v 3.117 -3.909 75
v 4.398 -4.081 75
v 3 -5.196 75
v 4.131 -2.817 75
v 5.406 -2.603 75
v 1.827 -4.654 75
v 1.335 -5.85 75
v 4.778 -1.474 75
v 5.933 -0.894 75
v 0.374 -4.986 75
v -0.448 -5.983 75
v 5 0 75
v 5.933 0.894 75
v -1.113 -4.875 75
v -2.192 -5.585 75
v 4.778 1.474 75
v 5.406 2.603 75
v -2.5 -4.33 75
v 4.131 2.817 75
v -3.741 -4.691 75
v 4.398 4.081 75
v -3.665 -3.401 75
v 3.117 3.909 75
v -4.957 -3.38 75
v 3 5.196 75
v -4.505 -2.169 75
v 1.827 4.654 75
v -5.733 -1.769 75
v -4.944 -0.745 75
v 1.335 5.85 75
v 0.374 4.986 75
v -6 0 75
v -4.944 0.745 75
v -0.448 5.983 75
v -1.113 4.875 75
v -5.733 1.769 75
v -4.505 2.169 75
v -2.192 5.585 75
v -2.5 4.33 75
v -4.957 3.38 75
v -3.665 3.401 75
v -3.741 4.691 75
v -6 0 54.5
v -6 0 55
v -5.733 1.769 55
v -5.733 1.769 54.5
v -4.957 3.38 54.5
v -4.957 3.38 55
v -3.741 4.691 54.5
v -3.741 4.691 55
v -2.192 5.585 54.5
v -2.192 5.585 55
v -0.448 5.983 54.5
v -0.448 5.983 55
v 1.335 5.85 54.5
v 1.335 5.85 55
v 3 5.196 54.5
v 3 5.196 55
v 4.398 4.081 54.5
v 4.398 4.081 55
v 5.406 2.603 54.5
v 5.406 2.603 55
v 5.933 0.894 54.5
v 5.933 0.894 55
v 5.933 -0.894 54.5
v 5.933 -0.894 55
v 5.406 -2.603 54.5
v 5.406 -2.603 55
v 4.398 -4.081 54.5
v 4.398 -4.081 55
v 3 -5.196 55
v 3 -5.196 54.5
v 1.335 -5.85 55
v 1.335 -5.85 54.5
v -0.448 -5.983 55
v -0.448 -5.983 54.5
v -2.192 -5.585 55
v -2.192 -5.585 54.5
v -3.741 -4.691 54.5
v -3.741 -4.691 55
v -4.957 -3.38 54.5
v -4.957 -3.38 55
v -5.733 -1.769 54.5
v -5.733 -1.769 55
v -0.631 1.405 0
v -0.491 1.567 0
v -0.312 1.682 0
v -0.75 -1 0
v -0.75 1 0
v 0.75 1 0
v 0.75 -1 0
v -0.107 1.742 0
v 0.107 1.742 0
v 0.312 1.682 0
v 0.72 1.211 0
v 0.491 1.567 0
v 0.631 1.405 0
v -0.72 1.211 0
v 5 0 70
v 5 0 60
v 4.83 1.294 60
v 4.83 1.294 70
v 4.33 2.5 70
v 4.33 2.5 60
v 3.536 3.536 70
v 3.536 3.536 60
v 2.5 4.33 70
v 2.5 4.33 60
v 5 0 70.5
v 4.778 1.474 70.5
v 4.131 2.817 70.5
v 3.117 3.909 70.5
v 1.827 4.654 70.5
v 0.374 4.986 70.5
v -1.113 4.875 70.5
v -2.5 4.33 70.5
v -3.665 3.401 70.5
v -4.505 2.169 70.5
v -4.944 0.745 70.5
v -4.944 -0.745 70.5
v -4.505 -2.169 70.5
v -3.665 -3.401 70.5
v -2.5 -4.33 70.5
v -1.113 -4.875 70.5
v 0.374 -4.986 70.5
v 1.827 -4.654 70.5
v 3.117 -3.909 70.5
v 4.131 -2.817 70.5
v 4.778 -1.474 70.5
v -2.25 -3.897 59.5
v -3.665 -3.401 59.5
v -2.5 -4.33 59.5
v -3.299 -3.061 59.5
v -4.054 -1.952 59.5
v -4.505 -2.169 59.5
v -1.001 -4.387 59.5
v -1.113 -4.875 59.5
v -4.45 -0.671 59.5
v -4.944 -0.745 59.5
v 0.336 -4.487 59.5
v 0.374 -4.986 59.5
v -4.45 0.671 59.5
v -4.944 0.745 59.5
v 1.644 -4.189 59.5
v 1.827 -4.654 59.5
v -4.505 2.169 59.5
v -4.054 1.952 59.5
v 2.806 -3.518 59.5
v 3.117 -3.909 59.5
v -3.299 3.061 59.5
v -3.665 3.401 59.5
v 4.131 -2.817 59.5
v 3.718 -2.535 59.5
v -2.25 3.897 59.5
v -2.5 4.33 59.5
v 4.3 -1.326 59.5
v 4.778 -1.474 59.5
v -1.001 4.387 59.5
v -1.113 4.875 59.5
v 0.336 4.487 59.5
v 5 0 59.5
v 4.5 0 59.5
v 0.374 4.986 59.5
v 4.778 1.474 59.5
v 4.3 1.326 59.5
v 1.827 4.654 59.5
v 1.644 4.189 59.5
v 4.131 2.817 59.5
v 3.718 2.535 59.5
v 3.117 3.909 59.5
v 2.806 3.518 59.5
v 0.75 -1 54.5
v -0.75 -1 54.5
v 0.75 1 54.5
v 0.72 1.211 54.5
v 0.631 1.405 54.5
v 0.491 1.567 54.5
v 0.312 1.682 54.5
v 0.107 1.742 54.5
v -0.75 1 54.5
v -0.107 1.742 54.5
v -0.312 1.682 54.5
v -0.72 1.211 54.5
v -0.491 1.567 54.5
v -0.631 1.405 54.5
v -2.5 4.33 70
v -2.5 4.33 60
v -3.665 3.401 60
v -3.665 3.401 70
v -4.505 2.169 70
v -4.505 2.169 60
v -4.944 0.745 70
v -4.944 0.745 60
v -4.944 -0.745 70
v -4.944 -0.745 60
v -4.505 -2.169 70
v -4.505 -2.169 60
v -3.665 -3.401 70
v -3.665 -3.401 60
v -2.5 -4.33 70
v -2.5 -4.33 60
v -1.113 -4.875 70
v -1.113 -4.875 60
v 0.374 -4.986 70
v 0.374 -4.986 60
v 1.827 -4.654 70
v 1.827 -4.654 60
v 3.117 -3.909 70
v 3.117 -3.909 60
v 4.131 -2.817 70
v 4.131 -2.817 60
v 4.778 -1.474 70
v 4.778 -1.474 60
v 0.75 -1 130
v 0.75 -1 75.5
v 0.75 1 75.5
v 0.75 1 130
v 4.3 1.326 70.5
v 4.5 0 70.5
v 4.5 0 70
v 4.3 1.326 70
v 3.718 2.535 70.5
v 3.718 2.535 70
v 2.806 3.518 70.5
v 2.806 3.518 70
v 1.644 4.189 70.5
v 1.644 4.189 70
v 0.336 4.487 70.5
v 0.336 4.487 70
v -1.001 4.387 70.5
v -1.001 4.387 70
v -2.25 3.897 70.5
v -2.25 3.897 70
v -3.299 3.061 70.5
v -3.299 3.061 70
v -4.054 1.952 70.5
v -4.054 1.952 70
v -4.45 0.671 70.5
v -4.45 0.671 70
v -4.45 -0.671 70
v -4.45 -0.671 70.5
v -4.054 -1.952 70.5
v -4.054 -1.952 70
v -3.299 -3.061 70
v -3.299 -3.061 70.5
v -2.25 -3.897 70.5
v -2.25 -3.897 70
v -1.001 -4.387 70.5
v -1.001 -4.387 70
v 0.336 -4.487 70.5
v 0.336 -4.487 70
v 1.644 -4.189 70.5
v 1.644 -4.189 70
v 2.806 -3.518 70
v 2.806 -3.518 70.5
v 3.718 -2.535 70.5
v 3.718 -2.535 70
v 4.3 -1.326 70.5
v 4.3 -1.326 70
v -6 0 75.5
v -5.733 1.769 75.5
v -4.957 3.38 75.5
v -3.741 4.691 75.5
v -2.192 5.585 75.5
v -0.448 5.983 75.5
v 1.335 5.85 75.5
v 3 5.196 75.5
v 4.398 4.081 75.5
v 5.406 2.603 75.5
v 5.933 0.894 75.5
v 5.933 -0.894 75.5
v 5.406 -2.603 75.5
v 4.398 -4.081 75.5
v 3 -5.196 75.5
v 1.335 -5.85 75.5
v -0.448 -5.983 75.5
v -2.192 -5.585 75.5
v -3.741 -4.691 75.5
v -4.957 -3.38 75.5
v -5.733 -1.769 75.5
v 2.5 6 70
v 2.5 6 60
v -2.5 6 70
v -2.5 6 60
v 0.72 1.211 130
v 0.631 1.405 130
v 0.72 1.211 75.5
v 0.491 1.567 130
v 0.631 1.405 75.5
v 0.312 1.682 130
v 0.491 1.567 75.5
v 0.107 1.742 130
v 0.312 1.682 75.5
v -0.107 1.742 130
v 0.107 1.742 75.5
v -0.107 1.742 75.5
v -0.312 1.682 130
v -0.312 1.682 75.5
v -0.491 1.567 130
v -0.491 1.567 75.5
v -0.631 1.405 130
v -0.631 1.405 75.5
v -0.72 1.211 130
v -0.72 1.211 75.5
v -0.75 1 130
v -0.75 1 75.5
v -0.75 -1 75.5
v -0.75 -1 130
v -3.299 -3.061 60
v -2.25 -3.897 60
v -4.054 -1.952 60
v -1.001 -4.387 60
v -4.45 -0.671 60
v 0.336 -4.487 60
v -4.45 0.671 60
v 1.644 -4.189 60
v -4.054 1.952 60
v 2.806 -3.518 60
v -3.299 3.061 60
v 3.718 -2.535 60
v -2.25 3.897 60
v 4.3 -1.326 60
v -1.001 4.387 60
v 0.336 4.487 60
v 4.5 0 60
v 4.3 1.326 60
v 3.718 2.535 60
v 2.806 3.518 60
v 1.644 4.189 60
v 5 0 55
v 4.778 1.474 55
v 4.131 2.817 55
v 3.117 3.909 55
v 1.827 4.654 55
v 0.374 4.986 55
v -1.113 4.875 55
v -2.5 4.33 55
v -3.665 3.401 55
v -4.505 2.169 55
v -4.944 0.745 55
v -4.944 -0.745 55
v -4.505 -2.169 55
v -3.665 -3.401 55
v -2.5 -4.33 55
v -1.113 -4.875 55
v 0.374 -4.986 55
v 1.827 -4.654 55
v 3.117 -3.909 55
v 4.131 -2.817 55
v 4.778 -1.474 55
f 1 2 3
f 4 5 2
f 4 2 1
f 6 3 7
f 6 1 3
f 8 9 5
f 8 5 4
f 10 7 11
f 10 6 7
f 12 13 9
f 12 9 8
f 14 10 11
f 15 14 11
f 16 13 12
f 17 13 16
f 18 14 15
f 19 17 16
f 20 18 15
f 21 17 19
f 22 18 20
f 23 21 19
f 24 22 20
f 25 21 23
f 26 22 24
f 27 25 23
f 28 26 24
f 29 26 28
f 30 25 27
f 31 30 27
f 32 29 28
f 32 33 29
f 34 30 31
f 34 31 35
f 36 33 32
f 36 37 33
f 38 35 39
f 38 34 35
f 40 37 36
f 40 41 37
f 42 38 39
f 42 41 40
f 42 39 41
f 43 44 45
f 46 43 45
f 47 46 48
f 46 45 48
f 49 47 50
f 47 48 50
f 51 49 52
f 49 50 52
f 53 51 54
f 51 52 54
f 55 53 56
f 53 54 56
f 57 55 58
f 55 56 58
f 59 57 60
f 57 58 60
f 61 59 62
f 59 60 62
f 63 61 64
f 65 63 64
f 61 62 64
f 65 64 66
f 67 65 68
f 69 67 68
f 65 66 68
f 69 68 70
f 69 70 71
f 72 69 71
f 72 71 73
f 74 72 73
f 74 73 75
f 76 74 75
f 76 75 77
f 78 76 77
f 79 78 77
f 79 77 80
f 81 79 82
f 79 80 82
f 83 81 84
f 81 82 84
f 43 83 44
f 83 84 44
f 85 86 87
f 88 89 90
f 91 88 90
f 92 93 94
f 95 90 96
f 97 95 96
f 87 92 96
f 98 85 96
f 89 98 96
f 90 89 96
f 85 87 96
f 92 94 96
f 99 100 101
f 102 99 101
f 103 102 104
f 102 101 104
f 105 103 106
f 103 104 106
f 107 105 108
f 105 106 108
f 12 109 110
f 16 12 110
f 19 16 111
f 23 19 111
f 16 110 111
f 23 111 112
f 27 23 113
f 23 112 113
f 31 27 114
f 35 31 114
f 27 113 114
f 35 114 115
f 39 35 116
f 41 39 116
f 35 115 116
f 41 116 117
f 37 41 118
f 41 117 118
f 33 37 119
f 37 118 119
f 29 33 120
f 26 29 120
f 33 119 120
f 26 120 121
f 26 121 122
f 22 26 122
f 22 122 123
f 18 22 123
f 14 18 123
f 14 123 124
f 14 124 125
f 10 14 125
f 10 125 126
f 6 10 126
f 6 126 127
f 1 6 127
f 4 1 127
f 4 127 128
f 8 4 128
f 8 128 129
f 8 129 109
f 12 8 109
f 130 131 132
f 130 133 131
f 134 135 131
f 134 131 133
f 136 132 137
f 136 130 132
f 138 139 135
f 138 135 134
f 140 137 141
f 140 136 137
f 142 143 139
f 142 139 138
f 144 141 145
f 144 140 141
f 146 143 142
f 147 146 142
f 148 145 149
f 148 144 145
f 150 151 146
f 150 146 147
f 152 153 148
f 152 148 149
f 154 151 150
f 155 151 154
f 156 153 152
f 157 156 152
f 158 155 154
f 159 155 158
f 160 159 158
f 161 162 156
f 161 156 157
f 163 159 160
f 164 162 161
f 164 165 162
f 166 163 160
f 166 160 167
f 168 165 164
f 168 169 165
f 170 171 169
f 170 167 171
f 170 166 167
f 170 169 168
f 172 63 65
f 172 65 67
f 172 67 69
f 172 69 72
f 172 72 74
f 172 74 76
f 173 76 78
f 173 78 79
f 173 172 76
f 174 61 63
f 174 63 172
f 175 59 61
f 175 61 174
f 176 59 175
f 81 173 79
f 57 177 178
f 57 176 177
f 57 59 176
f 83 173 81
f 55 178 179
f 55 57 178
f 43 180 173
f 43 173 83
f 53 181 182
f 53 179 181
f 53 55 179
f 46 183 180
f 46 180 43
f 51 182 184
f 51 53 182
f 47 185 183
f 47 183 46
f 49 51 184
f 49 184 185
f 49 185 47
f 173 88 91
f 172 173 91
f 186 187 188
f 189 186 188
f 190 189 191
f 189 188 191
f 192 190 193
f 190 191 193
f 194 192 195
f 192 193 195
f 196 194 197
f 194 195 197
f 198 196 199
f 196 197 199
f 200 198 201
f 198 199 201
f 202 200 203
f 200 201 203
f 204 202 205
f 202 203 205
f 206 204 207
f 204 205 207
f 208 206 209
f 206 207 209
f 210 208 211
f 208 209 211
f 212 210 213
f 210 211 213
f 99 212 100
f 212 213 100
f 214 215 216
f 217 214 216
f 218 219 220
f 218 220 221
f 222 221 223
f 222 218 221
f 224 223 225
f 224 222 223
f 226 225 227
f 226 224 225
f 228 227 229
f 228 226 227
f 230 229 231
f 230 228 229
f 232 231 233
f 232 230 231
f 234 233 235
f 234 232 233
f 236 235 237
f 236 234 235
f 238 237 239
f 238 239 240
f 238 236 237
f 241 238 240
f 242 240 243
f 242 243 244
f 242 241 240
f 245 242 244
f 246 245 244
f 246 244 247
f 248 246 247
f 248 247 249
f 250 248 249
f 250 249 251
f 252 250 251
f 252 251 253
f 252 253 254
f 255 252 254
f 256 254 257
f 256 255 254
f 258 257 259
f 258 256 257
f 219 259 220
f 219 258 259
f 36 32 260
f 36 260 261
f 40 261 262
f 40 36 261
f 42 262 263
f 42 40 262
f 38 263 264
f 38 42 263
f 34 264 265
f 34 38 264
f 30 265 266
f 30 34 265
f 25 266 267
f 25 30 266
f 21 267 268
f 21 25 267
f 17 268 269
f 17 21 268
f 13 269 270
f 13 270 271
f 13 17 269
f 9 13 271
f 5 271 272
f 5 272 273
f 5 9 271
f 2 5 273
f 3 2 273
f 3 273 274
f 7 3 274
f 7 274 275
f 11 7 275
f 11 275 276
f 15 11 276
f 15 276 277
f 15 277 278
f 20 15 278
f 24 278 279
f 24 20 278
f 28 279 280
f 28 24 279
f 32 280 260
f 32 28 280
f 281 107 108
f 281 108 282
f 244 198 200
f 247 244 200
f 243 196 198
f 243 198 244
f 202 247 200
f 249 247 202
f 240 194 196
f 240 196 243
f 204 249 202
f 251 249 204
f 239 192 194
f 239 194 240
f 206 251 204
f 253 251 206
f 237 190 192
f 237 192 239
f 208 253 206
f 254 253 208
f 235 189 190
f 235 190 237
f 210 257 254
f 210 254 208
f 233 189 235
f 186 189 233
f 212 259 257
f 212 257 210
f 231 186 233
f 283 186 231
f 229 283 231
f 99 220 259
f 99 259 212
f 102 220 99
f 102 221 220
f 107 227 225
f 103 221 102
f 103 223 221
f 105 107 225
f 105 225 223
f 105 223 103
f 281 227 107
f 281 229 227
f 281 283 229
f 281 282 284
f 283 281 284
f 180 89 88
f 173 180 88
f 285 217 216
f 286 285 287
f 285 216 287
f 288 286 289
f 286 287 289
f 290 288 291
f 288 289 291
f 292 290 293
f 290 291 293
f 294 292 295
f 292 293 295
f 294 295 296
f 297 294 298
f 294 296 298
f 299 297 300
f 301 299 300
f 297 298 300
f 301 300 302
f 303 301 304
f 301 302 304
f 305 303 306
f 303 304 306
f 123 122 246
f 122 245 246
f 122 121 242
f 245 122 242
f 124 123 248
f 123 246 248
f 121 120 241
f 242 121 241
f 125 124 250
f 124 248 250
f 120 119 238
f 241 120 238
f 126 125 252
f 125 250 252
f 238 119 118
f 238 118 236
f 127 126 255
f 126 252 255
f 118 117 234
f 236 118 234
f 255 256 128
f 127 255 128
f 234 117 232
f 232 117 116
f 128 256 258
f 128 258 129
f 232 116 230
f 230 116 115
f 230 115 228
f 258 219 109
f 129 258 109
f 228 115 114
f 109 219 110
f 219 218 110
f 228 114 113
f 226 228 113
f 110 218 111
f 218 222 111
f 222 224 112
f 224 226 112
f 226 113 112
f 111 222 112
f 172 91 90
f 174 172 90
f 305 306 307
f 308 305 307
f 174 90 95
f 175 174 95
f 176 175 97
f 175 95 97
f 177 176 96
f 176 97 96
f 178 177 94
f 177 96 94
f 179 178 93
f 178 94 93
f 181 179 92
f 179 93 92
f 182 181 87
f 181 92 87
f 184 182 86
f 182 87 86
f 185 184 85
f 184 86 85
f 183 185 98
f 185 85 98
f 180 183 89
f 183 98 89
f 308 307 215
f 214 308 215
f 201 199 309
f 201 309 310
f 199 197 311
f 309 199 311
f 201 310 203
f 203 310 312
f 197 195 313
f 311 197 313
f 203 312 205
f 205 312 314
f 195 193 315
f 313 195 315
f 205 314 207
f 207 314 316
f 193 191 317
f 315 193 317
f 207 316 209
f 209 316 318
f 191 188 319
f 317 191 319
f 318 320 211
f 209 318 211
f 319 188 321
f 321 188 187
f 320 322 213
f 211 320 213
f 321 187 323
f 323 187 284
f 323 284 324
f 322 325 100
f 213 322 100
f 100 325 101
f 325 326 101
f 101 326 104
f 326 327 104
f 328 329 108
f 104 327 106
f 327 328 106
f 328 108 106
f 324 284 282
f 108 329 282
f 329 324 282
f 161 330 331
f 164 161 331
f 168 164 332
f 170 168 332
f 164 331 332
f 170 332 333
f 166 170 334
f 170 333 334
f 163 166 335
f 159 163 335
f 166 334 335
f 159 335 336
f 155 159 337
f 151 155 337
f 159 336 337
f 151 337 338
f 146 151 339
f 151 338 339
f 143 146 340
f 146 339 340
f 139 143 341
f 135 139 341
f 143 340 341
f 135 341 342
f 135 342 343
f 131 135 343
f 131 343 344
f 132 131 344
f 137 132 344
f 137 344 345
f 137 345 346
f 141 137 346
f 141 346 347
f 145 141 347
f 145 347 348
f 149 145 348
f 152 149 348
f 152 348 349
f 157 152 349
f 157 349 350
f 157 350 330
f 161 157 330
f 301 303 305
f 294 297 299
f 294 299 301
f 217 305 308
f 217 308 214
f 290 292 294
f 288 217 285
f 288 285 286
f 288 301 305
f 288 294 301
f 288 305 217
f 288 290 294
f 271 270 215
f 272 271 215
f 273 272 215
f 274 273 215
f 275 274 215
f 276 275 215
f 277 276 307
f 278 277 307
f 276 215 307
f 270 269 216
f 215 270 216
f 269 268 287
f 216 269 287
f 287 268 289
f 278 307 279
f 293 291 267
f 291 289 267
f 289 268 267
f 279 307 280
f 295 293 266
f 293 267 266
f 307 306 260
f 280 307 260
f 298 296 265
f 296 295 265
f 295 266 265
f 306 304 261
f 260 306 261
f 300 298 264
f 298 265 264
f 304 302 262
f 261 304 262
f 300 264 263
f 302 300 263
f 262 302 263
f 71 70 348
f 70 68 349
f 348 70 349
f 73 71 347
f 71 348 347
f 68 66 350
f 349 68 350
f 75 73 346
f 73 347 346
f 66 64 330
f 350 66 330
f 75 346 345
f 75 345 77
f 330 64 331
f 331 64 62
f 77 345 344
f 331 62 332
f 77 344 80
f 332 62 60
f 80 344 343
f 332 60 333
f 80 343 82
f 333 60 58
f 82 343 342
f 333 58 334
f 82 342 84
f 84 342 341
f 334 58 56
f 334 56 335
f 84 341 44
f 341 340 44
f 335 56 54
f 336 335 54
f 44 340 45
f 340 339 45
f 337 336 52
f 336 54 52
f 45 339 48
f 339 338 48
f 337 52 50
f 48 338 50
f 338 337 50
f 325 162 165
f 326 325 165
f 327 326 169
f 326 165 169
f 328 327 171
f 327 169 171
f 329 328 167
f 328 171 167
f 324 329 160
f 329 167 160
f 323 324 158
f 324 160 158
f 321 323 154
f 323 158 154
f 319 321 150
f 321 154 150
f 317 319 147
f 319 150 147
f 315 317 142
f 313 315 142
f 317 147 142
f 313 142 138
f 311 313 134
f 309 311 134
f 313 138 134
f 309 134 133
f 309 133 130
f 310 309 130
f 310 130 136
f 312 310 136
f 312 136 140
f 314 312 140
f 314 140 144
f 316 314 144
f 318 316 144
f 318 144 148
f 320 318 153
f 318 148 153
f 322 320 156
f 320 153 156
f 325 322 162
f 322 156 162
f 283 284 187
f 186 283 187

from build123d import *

# Parameters (mm, degrees)
BOSS_EXTRUDE4_DEPTH = 55
SKETCH4_R           = 5
BOSS_EXTRUDE5_DEPTH = 5
BOSS_EXTRUDE6_DEPTH = 10
SKETCH6_R           = 5
BOSS_EXTRUDE7_DEPTH = 5
BOSS_EXTRUDE8_DEPTH = 55
CUT_EXTRUDE2_START  = -0.5
SKETCH8_R           = 5
SKETCH8_R_2         = 4.5
CUT_EXTRUDE2_DEPTH  = 0.5
SKETCH9_R           = 6
BOSS_EXTRUDE9_DEPTH = 0.5


with BuildPart() as part:
    # Sketch1 → Boss-Extrude4 (new body)
    with BuildSketch(Plane.XY):
        with BuildLine():
            ThreePointArc((-0.75, 1), (0, 0.25), (0.75, 1))
            Line((0.75, 1), (-0.75, 1))
        make_face()
        with BuildLine():
            Line((-0.75, 1), (0.75, 1))
            ThreePointArc((0.75, 1), (0, 1.75), (-0.75, 1))
        make_face()
        with BuildLine():
            Line((-0.75, -1), (0.75, -1))
            Line((0.75, -1), (0.75, 1))
            ThreePointArc((0.75, 1), (0, 0.25), (-0.75, 1))
            Line((-0.75, 1), (-0.75, -1))
        make_face()
    extrude(amount=BOSS_EXTRUDE4_DEPTH)

    # Sketch4 → Boss-Extrude5 (add)
    with BuildSketch(Plane.XY.offset(55)):
        Circle(SKETCH4_R)
    extrude(amount=BOSS_EXTRUDE5_DEPTH)

    # Sketch5 → Boss-Extrude6 (add)
    with BuildSketch(Plane.XY.offset(60)):
        with BuildLine():
            Line((2.5, 4.330127019), (2.5, 4))
            Line((2.5, 4), (-2.5, 4))
            Line((-2.5, 4), (-2.5, 4.330127019))
            ThreePointArc((-2.5, 4.330127019), (-2.5, -4.330127019), (5, 0))
            ThreePointArc((5, 0), (4.330127019, 2.5), (2.5, 4.330127019))
        make_face()
        with BuildLine():
            Line((-2.5, 4), (2.5, 4))
            Line((2.5, 4), (2.5, 4.330127019))
            ThreePointArc((2.5, 4.330127019), (0, 5), (-2.5, 4.330127019))
            Line((-2.5, 4.330127019), (-2.5, 4))
        make_face()
        with BuildLine():
            ThreePointArc((-2.5, 4.330127019), (0, 5), (2.5, 4.330127019))
            Line((2.5, 4.330127019), (2.5, 6))
            Line((2.5, 6), (-2.5, 6))
            Line((-2.5, 6), (-2.5, 4.330127019))
        make_face()
    extrude(amount=BOSS_EXTRUDE6_DEPTH)

    # Sketch6 → Boss-Extrude7 (add)
    with BuildSketch(Plane.XY.offset(70)):
        Circle(SKETCH6_R)
    extrude(amount=BOSS_EXTRUDE7_DEPTH)

    # Sketch7 → Boss-Extrude8 (add)
    with BuildSketch(Plane.XY.offset(75)):
        with BuildLine():
            ThreePointArc((-0.75, 1), (0, 0.25), (0.75, 1))
            Line((0.75, 1), (-0.75, 1))
        make_face()
        with BuildLine():
            Line((-0.75, 1), (0.75, 1))
            ThreePointArc((0.75, 1), (0, 1.75), (-0.75, 1))
        make_face()
        with BuildLine():
            Line((-0.75, -1), (0.75, -1))
            Line((0.75, -1), (0.75, 1))
            ThreePointArc((0.75, 1), (0, 0.25), (-0.75, 1))
            Line((-0.75, 1), (-0.75, -1))
        make_face()
    extrude(amount=BOSS_EXTRUDE8_DEPTH)

    # Sketch8 → Cut-Extrude2 (cut)
    with BuildSketch(Plane.XY.offset(60).offset(CUT_EXTRUDE2_START)):
        Circle(SKETCH8_R)
        Circle(SKETCH8_R_2, mode=Mode.SUBTRACT)
    cut_extrude2 = extrude(amount=CUT_EXTRUDE2_DEPTH, mode=Mode.SUBTRACT)

    # Mirror3: Cut-Extrude2 across plane
    add(cut_extrude2.mirror(Plane.XY.offset(65)), mode=Mode.SUBTRACT)

    # Sketch9 → Boss-Extrude9 (add)
    with BuildSketch(Plane(origin=(0, 0, 55), x_dir=(-1, 0, 0), z_dir=(0, 0, -1))):
        Circle(SKETCH9_R)
    boss_extrude9 = extrude(amount=BOSS_EXTRUDE9_DEPTH)

    # Mirror4: Boss-Extrude9 across plane
    add(boss_extrude9.mirror(Plane.XY.offset(65)))


solid = part.part
